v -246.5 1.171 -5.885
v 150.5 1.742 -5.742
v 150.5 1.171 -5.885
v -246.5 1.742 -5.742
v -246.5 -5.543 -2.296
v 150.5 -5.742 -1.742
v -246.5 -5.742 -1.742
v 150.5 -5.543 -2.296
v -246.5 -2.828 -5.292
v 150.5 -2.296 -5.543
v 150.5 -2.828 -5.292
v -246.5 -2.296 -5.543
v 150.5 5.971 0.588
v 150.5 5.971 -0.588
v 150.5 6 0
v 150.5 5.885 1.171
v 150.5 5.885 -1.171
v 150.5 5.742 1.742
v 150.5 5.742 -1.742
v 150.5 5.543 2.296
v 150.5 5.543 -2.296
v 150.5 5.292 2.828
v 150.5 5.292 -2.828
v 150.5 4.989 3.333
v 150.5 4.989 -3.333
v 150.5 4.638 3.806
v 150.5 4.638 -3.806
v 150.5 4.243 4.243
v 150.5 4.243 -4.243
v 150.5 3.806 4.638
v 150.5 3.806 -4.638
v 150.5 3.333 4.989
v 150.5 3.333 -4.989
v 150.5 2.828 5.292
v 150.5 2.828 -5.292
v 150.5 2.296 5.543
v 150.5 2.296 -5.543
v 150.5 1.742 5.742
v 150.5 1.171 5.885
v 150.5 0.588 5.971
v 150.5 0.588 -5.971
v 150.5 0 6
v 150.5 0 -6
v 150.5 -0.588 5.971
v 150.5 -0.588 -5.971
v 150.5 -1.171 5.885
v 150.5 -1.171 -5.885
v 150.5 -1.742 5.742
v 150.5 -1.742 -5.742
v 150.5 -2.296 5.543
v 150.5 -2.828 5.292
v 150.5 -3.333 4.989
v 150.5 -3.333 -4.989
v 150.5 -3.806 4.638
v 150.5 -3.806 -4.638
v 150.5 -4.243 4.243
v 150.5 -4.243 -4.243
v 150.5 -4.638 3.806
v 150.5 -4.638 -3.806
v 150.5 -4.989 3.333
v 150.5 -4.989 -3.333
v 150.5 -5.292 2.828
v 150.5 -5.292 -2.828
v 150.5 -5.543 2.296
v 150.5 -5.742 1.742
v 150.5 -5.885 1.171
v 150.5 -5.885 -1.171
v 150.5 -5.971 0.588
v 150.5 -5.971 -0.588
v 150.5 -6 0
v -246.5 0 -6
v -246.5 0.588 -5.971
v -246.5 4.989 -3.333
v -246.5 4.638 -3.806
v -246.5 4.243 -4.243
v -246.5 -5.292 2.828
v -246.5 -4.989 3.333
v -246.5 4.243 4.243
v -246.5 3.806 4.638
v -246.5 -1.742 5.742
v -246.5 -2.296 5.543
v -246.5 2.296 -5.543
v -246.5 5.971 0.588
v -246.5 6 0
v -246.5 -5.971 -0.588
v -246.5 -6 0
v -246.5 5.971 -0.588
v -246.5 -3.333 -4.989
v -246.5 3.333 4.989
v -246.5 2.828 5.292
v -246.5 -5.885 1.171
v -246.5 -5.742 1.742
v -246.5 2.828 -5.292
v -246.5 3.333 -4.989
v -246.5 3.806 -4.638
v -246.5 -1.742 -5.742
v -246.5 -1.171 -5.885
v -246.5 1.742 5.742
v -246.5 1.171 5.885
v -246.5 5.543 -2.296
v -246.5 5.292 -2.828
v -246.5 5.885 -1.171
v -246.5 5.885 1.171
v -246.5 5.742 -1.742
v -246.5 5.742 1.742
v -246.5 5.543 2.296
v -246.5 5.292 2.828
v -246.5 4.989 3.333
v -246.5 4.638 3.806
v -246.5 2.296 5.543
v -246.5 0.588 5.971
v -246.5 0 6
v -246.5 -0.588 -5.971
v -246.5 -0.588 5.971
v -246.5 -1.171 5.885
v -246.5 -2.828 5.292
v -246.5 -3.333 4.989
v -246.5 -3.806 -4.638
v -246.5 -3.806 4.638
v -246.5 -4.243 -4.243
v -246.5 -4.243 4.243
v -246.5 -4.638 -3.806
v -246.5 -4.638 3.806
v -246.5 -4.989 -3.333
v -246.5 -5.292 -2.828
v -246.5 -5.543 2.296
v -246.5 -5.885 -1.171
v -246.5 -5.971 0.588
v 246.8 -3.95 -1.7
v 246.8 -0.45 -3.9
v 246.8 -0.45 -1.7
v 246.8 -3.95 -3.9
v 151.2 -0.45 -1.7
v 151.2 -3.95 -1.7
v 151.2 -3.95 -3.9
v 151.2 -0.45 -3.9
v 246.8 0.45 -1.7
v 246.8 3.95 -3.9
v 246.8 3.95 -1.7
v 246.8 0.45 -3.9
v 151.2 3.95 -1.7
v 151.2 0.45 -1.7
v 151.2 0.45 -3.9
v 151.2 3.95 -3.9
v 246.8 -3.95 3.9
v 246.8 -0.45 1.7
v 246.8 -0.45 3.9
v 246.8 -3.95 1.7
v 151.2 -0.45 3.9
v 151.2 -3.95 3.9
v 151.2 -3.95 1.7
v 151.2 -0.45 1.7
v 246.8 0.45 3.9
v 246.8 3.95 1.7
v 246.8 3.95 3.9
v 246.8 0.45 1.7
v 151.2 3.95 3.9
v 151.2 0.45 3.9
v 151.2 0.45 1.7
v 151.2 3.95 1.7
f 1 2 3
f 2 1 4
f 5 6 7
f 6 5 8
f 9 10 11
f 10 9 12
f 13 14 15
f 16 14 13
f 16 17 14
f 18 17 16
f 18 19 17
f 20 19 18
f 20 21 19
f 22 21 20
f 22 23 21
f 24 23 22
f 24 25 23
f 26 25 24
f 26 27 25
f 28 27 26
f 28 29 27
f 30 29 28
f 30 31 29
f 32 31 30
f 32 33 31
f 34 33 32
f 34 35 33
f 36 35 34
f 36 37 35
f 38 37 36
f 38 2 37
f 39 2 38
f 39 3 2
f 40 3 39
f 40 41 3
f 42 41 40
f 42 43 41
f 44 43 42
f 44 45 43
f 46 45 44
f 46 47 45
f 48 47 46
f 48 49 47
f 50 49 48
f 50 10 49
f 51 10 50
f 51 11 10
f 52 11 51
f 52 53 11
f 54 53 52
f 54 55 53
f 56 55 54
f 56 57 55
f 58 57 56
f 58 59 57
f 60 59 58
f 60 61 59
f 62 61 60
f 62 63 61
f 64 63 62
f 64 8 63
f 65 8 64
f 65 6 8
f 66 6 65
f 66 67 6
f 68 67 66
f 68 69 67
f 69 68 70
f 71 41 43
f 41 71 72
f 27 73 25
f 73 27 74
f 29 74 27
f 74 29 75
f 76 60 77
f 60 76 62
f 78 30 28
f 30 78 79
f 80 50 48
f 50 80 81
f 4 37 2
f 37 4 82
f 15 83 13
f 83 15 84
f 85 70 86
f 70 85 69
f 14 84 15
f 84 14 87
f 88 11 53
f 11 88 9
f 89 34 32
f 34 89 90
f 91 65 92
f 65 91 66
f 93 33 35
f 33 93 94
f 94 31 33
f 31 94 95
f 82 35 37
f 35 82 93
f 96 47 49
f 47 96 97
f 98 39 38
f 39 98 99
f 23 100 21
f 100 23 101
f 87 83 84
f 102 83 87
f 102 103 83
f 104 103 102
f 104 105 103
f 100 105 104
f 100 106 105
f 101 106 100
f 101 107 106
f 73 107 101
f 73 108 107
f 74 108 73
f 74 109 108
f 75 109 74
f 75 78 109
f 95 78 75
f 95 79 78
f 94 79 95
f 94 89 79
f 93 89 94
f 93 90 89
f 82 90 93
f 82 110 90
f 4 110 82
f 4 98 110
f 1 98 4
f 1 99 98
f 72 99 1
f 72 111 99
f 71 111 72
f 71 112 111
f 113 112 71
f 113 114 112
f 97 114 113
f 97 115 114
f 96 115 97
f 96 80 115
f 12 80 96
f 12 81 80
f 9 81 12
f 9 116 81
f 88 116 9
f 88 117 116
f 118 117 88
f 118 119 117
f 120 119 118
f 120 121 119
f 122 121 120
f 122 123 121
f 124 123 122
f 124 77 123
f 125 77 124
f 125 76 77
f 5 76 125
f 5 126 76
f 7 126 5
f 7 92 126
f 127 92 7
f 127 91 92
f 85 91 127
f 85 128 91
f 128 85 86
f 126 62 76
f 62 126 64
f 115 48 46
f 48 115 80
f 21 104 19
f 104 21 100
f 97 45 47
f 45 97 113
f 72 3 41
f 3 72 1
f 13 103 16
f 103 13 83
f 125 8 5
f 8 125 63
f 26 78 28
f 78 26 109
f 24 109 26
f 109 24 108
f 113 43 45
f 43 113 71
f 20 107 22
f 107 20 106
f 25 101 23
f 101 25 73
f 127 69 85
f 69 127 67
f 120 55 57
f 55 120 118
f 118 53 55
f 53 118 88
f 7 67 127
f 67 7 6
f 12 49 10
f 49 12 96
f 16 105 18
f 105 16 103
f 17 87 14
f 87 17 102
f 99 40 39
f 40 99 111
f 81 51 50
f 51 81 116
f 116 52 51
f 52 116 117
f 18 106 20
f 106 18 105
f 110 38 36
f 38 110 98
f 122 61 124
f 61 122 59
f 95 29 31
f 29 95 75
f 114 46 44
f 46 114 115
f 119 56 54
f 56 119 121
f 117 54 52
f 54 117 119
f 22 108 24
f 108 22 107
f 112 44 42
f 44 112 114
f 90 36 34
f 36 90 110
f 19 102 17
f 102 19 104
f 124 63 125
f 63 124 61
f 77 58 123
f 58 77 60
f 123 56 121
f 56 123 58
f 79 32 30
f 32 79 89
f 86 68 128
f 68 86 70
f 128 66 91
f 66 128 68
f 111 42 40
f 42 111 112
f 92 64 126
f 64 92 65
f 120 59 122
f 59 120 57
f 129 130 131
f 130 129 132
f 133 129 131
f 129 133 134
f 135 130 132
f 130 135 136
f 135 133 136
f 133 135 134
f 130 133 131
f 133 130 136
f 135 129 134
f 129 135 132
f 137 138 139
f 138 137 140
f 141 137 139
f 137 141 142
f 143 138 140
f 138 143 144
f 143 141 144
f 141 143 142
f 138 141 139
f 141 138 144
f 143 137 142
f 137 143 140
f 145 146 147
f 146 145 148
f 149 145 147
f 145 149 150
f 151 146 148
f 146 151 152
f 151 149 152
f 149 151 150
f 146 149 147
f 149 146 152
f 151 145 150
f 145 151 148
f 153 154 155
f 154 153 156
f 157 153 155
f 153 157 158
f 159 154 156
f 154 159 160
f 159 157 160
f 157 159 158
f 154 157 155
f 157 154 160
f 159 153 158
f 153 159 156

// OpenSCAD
// ============================================================================
// Atom Lithography Machine — Parametric OpenSCAD Module (S6.9-03)
// ============================================================================
// part_id           : S6.9-03
// parent_bom_id     : S6.9
// subsystem         : S6
// part_name         : DR tarafi Ø12x397 mm Cu bara + 4x paralel S-ilmek OFHC Cu orgu demeti (k=52.7 N/m, Exp133)
// material          : OFHC Cu
// temp_stage        : 20 mK (MXC)
// vacuum_grade      : UHV / Kriyo-vakum
// tolerance         : k<=60 N/m, RRR>=200
// computed_mass_kg  : 0.41337
// envelope_mm       : 492.900 x 14.000 x 14.000
// design_maturity   : M0_M1_DETAILED_CAD_DESIGN_ONLY
// no_lab_measurement: true
// iec61508_certified: false
// semi_s2_certified : false
// Units: millimeters (mm)
// ============================================================================

$fn = 64;

// Nominal bounding envelope parameters (mm)
bbox_x = 492.9000;
bbox_y = 14.0000;
bbox_z = 14.0000;

// Part-specific parametric dimensions
busbar_d = 12.0;
busbar_l = 397.0;
n_braids = 4;
k_braid_n_per_m = 52.7;
dt_mk = 3.7;

// Interface / port parameters (mm)
port_mxc_dr_clamp_od = 14.000;
port_mxc_dr_clamp_bolts = 4;
port_cold_island_braid_end_od = 12.000;

module part_S6_9_03() {
  union() {
    // DR-side Ø12x397 mm OFHC Cu busbar
    translate([-48.000, 0.000, 0.000]) rotate([0.000, 90.000, 0.000]) cylinder(d=12.000, h=397.000, center=true);
    // S-loop OFHC Cu braid #1 w/ Au clamp lugs
    translate([199.000, -2.200, -2.800]) cube([95.600, 3.500, 2.200], center=true);
    // S-loop OFHC Cu braid #2 w/ Au clamp lugs
    translate([199.000, 2.200, -2.800]) cube([95.600, 3.500, 2.200], center=true);
    // S-loop OFHC Cu braid #3 w/ Au clamp lugs
    translate([199.000, -2.200, 2.800]) cube([95.600, 3.500, 2.200], center=true);
    // S-loop OFHC Cu braid #4 w/ Au clamp lugs
    translate([199.000, 2.200, 2.800]) cube([95.600, 3.500, 2.200], center=true);
  }
}

// World assembly mounting transform (global machine frame, mm / deg):
// translate([-308.000, 0.000, 493.500]) rotate([0.000, 0.000, 0.000]) part_S6_9_03();

part_S6_9_03();
